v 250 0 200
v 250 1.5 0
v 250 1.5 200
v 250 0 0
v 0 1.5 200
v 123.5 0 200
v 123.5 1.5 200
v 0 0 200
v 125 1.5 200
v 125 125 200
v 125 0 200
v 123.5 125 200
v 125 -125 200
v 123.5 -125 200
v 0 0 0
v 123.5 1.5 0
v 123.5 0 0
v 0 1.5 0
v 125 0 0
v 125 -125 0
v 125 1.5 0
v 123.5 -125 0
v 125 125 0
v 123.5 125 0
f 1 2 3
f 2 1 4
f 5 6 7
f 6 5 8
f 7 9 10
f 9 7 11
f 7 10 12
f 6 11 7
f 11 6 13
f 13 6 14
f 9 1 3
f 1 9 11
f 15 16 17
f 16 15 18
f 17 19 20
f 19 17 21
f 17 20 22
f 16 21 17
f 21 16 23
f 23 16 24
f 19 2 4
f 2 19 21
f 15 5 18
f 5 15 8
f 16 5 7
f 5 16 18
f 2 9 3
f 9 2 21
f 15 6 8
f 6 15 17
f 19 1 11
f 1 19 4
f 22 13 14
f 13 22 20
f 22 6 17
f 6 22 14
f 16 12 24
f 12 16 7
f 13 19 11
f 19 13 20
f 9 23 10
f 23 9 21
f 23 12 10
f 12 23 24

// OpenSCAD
// Work in progress

length = 250;
thickness = 1.5;
height = 200;


cube([length,thickness,height]);

translate([length/2,-length/2,0]) rotate([0,0,90]) cube([length,thickness,height]);
